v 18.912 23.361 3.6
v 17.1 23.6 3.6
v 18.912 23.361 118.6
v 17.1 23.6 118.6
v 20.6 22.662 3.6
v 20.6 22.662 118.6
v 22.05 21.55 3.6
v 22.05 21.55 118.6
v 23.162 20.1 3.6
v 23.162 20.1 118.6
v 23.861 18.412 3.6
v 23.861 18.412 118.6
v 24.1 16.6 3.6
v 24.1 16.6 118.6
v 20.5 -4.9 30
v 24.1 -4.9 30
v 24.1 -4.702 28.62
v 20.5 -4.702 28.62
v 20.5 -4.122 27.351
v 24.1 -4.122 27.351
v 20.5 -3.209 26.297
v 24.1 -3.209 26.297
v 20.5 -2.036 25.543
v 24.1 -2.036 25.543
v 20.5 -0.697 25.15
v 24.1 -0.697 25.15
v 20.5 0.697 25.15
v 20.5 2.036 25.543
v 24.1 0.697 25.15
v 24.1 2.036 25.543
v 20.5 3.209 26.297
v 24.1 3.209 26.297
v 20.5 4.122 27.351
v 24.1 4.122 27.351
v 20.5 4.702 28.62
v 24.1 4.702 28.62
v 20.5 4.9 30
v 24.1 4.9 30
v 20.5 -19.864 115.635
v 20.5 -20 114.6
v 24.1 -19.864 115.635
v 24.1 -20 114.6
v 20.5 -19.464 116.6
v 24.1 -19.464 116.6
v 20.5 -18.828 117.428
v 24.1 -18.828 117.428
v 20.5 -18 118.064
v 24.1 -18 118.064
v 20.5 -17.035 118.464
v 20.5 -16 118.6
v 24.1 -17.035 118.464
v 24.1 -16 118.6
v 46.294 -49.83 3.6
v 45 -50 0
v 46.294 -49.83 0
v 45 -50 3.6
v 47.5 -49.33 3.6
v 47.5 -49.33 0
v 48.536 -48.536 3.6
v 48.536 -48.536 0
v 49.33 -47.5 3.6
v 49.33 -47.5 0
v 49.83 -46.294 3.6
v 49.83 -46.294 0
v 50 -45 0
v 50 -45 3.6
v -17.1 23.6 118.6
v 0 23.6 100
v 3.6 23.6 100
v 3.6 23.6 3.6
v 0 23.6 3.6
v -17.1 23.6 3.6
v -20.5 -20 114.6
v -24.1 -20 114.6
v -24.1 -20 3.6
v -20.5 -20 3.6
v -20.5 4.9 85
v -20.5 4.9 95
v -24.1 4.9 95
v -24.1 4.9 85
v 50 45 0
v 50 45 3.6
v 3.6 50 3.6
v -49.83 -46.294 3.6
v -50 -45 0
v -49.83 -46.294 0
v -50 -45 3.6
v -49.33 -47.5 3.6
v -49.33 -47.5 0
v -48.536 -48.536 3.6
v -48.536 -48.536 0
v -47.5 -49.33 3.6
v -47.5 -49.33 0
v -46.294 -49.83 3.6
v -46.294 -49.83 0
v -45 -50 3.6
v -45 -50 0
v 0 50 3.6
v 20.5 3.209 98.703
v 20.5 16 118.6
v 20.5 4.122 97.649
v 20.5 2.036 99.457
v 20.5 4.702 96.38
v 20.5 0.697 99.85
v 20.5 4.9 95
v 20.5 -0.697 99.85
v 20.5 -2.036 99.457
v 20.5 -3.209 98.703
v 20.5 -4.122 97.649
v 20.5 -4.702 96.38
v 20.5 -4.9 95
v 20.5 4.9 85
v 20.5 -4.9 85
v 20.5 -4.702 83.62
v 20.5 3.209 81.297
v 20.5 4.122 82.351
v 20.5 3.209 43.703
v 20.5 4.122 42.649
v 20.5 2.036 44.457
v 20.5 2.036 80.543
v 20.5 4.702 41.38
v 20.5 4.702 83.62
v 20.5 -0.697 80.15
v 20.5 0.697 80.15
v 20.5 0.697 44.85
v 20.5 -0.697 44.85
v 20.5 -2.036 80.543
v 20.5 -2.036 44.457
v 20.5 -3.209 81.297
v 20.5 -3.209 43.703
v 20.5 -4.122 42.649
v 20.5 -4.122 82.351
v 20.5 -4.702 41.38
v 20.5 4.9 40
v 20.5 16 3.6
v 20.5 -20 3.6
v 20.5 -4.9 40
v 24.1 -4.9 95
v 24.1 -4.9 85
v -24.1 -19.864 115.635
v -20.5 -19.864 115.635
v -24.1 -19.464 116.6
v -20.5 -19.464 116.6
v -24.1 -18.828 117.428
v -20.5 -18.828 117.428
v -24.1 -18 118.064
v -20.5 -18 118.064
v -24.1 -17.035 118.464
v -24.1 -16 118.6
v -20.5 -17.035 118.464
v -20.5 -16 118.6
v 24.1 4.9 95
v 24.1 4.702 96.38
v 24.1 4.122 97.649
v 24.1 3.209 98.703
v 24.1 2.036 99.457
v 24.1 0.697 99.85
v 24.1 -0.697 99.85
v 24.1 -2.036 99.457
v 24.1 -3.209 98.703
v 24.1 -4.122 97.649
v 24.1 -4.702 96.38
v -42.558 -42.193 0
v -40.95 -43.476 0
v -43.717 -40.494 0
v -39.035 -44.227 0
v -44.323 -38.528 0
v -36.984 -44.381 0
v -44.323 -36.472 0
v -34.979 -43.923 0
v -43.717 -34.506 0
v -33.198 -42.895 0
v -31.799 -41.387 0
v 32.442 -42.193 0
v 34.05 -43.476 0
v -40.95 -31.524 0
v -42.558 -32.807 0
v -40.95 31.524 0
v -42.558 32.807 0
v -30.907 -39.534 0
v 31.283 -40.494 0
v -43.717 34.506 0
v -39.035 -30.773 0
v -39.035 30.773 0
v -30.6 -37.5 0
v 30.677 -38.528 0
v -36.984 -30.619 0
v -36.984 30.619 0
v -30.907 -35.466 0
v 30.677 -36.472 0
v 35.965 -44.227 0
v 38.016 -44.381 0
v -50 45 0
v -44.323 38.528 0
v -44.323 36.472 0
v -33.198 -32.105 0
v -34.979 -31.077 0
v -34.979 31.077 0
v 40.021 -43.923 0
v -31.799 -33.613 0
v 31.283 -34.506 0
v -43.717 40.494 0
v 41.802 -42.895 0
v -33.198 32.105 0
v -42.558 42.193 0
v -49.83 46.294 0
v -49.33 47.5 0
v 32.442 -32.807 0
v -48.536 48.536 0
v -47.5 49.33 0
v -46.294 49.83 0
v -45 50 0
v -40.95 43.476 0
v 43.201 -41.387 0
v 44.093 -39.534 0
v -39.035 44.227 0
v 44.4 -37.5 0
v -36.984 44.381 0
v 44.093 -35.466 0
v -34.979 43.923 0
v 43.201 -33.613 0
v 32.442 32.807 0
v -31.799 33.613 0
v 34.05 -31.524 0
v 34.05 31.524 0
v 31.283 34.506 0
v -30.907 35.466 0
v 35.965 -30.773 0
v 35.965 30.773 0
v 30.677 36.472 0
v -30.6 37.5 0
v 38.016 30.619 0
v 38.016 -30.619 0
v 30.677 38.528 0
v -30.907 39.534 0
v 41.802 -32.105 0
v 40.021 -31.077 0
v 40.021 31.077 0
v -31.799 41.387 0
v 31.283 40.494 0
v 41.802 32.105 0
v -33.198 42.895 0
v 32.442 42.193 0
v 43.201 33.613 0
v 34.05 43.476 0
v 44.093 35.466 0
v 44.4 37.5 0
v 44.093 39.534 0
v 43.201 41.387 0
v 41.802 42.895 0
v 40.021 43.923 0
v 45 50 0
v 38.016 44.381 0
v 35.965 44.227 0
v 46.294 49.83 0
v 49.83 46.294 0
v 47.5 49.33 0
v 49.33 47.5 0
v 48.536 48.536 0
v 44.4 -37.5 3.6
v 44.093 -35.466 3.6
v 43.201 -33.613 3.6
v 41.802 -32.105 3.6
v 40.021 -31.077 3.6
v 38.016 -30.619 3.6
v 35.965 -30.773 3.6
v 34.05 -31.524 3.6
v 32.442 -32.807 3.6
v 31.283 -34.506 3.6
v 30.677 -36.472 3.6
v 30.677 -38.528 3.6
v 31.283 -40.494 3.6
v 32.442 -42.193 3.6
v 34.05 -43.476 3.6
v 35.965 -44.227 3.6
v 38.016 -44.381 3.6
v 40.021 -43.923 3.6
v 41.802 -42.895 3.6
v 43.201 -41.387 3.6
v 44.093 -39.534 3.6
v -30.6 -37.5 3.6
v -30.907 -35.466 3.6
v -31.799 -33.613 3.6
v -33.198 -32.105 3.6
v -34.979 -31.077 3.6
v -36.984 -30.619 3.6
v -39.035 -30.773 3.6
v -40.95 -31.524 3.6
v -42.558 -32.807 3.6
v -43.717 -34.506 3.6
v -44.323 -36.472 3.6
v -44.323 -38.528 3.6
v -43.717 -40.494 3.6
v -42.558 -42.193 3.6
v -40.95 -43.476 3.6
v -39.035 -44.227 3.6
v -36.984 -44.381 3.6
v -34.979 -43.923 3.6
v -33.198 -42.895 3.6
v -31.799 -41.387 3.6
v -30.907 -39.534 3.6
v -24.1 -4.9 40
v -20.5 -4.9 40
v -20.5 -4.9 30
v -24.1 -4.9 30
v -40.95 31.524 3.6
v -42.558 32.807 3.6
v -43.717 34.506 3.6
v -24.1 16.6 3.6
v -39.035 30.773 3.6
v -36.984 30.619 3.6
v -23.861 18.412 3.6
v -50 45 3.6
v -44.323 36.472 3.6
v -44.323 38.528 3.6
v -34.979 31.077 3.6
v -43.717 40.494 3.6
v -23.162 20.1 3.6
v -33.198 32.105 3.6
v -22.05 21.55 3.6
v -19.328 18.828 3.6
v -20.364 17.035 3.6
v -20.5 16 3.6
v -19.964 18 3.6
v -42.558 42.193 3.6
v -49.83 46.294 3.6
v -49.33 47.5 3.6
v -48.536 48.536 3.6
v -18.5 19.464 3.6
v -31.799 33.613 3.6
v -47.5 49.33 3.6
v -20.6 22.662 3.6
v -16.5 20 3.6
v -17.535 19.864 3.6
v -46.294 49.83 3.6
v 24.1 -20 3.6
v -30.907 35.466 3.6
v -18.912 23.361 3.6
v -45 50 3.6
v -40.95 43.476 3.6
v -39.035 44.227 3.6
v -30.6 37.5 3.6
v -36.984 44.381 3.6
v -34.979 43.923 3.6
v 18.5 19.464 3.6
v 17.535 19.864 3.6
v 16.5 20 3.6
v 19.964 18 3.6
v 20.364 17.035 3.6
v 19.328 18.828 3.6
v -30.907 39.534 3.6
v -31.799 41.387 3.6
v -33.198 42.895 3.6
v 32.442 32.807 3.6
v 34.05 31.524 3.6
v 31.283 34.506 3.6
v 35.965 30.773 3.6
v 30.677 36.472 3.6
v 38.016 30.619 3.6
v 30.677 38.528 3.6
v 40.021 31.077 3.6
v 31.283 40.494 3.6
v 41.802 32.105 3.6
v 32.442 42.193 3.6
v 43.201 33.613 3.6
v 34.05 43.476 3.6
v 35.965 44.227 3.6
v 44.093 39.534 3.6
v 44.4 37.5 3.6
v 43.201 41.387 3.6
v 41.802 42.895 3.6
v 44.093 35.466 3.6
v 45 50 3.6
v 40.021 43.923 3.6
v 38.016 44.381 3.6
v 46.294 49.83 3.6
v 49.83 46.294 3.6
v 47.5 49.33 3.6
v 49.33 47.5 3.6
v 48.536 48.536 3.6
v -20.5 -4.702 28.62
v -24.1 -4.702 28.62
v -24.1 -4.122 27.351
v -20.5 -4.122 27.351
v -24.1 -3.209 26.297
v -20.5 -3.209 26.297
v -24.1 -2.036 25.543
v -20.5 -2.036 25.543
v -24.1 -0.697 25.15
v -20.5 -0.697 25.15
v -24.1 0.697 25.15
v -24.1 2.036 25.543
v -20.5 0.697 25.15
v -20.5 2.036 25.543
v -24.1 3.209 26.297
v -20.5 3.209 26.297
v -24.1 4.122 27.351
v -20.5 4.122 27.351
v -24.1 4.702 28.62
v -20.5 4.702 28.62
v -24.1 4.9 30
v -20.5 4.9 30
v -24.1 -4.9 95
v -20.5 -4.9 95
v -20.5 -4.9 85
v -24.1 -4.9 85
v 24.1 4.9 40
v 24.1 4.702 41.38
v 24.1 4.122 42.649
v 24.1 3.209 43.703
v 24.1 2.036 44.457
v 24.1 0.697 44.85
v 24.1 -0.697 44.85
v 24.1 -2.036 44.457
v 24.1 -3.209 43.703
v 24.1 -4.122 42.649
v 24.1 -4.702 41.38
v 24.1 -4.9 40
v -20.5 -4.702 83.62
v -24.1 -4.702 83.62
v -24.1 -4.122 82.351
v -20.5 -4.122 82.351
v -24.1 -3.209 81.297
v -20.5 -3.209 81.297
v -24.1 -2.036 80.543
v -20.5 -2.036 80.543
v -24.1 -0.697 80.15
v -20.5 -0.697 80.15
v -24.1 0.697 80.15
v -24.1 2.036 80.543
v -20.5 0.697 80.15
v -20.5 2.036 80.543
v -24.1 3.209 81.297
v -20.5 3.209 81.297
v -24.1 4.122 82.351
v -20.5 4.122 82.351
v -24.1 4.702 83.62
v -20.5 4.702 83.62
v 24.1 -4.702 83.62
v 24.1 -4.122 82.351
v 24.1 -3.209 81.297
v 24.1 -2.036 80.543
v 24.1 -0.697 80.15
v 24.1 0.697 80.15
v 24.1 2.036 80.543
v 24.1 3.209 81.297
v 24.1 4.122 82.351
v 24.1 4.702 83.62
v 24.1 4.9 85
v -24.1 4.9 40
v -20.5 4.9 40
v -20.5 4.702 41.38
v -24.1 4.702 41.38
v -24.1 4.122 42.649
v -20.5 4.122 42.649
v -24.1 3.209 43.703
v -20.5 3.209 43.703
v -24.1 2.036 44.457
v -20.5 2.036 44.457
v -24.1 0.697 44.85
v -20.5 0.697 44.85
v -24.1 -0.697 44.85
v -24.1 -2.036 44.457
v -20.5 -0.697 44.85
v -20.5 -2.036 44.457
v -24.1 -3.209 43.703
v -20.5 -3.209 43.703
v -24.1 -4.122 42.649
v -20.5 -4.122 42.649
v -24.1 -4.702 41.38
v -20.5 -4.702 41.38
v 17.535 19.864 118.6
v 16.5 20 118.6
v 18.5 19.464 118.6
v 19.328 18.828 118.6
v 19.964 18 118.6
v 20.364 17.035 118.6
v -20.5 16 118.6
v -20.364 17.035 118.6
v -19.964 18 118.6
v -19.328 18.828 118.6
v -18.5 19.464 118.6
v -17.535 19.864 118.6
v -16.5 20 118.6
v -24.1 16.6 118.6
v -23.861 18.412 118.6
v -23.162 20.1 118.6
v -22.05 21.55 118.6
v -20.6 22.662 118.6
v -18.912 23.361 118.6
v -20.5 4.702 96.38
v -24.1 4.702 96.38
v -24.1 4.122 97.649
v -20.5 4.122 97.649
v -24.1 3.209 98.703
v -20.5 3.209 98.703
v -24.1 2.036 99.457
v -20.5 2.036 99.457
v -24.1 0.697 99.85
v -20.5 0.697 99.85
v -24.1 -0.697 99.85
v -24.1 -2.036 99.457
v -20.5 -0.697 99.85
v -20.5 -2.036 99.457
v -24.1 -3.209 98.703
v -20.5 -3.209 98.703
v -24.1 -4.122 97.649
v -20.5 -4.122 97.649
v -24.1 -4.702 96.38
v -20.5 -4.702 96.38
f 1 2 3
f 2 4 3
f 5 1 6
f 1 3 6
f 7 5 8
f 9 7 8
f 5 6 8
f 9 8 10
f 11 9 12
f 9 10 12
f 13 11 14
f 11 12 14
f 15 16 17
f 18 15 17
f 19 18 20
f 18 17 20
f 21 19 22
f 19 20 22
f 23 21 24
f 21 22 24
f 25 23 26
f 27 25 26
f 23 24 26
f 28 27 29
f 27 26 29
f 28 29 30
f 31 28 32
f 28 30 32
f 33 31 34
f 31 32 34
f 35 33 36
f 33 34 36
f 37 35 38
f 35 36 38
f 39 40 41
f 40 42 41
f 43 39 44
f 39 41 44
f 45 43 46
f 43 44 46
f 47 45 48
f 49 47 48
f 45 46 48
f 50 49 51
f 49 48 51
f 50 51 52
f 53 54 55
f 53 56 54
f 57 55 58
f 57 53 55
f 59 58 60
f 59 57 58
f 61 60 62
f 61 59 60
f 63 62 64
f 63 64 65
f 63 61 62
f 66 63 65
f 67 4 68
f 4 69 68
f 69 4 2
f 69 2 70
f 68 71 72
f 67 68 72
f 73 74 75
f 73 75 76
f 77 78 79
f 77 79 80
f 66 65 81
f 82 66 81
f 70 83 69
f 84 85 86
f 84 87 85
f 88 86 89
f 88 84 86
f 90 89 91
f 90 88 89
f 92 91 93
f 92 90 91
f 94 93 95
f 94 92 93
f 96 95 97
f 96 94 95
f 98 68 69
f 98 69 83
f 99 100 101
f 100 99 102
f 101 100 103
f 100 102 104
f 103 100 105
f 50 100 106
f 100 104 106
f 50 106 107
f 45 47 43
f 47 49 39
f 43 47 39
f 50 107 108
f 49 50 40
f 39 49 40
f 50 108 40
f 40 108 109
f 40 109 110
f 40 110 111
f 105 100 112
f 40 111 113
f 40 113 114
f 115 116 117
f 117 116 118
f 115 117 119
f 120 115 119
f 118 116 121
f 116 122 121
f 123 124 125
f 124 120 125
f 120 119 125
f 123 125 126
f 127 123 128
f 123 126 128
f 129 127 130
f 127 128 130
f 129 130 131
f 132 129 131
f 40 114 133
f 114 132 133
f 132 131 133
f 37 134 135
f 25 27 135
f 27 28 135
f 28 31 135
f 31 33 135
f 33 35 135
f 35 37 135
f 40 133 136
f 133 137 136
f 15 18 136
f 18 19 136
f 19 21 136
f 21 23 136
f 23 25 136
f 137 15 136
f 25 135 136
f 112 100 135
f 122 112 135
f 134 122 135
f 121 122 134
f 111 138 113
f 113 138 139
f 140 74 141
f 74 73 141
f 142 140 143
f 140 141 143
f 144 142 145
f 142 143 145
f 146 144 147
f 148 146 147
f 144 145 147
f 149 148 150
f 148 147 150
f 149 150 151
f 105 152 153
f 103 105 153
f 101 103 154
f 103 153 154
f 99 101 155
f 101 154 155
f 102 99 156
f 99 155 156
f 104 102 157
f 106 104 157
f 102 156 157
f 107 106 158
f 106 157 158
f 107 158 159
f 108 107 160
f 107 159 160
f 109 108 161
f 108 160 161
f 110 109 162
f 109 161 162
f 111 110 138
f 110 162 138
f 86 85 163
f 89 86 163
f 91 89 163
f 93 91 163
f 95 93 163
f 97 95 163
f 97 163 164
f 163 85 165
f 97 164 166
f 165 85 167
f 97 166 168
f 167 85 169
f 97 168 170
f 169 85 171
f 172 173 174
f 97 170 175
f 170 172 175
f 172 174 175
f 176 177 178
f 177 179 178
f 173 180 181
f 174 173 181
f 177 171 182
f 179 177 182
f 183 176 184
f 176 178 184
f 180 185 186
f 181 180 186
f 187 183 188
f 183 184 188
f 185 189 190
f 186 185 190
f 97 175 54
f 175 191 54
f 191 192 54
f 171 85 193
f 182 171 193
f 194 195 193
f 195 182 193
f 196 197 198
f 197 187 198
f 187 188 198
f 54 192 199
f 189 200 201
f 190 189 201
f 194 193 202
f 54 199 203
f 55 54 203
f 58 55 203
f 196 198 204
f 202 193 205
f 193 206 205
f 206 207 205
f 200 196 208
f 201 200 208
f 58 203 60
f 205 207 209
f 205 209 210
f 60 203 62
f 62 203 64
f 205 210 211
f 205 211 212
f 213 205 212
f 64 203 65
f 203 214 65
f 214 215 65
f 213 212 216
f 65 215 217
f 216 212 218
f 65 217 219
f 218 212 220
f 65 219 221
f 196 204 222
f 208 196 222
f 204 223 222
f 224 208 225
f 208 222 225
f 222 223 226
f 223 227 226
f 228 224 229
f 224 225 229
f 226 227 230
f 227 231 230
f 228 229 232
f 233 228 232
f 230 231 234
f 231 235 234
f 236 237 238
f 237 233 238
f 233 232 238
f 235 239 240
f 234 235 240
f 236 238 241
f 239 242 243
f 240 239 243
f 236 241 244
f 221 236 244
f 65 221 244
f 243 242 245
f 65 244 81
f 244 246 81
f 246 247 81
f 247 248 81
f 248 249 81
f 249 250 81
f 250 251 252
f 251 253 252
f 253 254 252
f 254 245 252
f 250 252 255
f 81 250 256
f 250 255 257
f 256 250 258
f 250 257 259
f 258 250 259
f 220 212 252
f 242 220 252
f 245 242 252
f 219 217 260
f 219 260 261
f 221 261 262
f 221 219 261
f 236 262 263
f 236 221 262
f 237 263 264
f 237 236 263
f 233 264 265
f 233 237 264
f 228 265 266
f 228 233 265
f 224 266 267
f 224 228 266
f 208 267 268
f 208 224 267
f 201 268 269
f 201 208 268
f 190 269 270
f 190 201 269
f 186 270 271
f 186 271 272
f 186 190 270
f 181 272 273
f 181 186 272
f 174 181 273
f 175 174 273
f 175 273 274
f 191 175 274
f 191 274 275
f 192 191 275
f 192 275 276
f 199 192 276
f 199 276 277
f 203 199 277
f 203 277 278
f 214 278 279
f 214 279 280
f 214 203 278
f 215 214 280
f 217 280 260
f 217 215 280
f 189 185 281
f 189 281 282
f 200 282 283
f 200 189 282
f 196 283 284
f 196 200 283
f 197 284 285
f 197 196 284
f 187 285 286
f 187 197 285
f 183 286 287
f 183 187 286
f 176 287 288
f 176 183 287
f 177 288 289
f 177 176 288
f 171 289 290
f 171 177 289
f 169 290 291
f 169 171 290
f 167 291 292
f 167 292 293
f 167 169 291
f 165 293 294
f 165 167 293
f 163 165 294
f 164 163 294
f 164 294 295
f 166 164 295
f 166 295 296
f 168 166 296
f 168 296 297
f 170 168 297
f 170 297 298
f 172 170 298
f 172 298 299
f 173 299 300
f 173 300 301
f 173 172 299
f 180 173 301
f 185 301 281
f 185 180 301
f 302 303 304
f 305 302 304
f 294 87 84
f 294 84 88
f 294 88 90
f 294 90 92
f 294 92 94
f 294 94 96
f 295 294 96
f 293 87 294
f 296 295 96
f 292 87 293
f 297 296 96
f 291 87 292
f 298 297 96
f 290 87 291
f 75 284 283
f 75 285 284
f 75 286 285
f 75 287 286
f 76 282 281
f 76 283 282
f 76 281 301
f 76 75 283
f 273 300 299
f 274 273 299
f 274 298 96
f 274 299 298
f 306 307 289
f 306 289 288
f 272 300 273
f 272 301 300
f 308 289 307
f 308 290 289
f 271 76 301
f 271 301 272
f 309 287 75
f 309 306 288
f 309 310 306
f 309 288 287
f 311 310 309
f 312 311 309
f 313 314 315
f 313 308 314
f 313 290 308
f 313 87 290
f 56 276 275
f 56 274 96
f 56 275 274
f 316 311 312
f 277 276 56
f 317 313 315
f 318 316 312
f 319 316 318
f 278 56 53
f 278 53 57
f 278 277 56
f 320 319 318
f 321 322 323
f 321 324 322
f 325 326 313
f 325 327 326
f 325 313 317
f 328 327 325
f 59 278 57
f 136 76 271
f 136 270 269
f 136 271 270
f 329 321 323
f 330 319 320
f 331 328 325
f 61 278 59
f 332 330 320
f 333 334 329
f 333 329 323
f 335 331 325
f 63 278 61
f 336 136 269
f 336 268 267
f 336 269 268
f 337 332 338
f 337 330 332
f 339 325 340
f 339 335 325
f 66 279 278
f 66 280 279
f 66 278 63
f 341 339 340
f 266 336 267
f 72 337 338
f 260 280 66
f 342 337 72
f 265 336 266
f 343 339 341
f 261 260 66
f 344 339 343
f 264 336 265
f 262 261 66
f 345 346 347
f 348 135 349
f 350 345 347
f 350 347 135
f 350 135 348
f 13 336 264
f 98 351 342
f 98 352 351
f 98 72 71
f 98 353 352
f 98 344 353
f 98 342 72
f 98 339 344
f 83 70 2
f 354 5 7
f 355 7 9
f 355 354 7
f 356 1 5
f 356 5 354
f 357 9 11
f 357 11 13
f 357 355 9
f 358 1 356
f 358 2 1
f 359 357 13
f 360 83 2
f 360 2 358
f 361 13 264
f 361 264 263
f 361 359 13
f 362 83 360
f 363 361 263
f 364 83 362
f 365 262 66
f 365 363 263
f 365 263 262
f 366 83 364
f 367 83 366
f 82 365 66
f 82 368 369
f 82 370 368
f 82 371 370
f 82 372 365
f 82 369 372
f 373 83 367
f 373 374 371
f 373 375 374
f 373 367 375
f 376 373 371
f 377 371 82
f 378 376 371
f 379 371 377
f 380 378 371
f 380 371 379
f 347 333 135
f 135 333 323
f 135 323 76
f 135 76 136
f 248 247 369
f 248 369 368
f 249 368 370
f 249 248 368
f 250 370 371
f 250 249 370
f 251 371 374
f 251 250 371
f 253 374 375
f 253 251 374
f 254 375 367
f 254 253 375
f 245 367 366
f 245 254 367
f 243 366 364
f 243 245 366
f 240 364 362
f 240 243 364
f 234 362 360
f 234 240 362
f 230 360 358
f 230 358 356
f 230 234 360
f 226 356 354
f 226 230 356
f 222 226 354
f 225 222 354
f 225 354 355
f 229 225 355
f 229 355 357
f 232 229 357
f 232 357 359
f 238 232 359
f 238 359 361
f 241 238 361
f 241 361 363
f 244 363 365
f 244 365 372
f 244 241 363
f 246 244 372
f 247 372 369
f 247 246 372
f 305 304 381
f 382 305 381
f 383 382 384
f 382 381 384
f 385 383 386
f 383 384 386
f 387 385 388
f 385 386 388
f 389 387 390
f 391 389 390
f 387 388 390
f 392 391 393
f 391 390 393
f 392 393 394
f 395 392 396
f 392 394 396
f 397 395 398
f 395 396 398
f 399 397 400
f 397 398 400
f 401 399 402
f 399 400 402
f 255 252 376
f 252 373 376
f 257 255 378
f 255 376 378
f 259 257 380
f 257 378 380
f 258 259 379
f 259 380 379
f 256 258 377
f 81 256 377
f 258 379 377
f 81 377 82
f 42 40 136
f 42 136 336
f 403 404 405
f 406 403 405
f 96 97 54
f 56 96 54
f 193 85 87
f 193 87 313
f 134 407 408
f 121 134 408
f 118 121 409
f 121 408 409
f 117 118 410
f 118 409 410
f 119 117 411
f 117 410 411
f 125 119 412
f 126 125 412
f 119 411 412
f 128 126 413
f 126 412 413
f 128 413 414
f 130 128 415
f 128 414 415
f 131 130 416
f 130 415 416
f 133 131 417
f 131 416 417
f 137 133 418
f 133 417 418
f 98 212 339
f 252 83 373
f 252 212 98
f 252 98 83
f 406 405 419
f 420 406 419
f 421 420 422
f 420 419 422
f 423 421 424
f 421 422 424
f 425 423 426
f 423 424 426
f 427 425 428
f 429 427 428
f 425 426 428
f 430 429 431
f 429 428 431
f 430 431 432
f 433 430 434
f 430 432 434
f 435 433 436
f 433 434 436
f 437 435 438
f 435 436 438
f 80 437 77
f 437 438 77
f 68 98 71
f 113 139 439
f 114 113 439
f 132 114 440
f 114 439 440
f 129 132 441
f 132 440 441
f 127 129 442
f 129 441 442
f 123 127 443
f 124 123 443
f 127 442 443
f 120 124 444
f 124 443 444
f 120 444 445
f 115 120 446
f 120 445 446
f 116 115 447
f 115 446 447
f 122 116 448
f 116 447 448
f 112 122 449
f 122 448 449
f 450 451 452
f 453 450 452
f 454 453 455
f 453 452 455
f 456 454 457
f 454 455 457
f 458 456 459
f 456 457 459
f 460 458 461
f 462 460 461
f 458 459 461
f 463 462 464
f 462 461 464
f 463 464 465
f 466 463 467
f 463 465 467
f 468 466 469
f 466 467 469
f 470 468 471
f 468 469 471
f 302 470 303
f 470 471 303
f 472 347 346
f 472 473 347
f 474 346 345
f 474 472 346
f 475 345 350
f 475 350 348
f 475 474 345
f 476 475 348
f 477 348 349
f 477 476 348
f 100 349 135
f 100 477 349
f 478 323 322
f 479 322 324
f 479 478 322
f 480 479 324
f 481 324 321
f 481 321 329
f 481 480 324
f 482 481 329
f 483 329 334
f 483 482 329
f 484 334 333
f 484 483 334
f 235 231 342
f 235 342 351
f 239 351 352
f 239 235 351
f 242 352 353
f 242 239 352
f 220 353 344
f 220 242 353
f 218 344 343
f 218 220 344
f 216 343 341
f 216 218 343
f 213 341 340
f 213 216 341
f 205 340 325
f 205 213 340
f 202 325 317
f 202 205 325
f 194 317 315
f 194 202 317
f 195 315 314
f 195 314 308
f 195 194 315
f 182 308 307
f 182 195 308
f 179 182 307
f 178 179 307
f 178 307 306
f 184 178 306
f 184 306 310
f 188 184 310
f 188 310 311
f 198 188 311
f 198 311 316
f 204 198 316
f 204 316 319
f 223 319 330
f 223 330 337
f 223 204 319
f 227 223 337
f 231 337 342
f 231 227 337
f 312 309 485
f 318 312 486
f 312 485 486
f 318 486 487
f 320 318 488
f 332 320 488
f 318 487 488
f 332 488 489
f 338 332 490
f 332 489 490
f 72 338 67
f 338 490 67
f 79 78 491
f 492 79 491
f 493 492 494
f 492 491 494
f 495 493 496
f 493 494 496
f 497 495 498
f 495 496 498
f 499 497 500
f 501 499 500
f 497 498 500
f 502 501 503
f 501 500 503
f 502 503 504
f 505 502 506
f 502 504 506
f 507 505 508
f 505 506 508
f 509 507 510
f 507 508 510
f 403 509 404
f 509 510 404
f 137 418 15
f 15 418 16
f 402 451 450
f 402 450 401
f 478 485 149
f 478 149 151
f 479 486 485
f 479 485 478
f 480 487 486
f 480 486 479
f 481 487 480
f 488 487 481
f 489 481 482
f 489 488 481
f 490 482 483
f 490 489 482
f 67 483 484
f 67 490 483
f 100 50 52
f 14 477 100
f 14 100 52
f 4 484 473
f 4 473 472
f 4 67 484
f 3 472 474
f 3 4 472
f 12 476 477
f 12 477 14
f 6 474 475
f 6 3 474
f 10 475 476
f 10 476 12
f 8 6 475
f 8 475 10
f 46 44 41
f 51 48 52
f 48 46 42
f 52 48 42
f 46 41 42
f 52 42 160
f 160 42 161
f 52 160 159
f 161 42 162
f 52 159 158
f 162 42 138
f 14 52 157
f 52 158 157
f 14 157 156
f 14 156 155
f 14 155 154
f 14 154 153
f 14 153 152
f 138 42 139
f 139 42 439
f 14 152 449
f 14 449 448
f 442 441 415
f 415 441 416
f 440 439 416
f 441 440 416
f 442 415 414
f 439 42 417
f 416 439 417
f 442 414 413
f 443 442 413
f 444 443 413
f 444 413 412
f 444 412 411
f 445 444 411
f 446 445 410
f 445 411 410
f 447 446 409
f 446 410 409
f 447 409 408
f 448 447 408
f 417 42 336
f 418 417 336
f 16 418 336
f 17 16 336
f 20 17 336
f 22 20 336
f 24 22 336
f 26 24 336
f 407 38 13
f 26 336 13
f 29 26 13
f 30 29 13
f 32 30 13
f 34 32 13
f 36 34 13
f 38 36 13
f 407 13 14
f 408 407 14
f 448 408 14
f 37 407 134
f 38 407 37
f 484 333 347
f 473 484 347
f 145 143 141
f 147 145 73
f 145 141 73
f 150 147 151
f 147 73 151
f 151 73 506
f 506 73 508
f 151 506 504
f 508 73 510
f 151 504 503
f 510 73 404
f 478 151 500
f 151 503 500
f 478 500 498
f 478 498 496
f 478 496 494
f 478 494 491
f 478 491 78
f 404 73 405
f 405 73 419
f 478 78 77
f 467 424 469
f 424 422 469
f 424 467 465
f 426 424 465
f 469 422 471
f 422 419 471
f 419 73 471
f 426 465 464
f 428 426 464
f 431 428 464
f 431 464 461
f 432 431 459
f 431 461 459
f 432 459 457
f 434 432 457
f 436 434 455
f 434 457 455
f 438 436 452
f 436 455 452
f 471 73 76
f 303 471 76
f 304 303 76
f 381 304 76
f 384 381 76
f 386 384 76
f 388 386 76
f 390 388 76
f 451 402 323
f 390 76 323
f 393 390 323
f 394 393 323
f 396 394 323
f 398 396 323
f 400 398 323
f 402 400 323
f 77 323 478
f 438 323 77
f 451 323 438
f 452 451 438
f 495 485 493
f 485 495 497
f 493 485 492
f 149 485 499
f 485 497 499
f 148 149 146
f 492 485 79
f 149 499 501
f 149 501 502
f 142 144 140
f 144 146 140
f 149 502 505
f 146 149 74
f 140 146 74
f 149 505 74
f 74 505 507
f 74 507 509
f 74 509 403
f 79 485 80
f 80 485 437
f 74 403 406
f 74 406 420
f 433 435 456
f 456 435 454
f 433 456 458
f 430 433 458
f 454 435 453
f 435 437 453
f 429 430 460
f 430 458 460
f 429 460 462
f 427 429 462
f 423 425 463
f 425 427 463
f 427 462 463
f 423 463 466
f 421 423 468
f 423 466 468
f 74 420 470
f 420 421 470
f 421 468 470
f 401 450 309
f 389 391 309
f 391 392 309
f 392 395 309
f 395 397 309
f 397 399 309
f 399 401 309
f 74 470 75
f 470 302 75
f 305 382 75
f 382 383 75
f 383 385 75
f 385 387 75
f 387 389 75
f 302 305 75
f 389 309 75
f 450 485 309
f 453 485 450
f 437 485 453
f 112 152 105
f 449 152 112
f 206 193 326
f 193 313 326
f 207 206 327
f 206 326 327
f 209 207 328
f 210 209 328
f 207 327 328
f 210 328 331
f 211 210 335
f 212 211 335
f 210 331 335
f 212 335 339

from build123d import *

# Parameters (mm, degrees)
SKETCH_W     = 100
SKETCH_H     = 100
SKETCH_R     = 6.9
PAD_DEPTH    = 3.6
PAD001_DEPTH = 115
POCKET_DEPTH = 74.101
PAD002_DEPTH = 3.6
FILLET_R     = 5
FILLET001_R  = 4
FILLET002_R  = 7


with BuildPart() as part:
    # Sketch → Pad (new body)
    with BuildSketch(Plane.XY):
        Rectangle(SKETCH_W, SKETCH_H)
        with Locations((37.5, 37.5)):
            Circle(SKETCH_R, mode=Mode.SUBTRACT)
        with Locations((-37.5, 37.5)):
            Circle(SKETCH_R, mode=Mode.SUBTRACT)
        with Locations((37.5, -37.5)):
            Circle(SKETCH_R, mode=Mode.SUBTRACT)
        with Locations((-37.5, -37.5)):
            Circle(SKETCH_R, mode=Mode.SUBTRACT)
    extrude(amount=PAD_DEPTH)

    # Sketch001 (on Face10 of Pad) → Pad001 (join)
    with BuildSketch(Plane.XY.offset(3.6)):
        Polygon((-20.5, -20), (-20.5, 20), (20.5, 20), (20.5, -20), (24.1, -20), (24.1, 23.6), (-24.1, 23.6), (-24.1, -20), align=None)
    extrude(amount=PAD001_DEPTH)

    # Sketch002 (on Face15 of Pad001) → Pocket (cut, through all)
    with BuildSketch(Plane.YZ.offset(24.1)):
        with BuildLine():
            ThreePointArc((4.9, 95), (0, 99.9), (-4.9, 95))
            Line((-4.9, 95), (-4.9, 85))
            ThreePointArc((-4.9, 85), (0, 80.1), (4.9, 85))
            Line((4.9, 95), (4.9, 85))
        make_face()
        with BuildLine():
            ThreePointArc((4.9, 40), (0, 44.9), (-4.9, 40))
            Line((-4.9, 40), (-4.9, 30))
            ThreePointArc((-4.9, 30), (0, 25.1), (4.9, 30))
            Line((4.9, 40), (4.9, 30))
        make_face()
    extrude(amount=-POCKET_DEPTH, mode=Mode.SUBTRACT)

    # Sketch003 → Pad002 (join)
    with BuildSketch(Plane.YZ):
        Polygon((23.6, 100), (50, 3.6), (23.6, 3.6), align=None)
    extrude(amount=PAD002_DEPTH)

    # Fillet
    fillet_edges = [part.edges().sort_by_distance(p)[0] for p in [
        (-50, 50, 1.8),
        (-50, -50, 1.8),
        (50, -50, 1.8),
        (50, 50, 1.8),
    ]]
    fillet(fillet_edges, radius=FILLET_R)

    # Fillet001
    fillet001_edges = [part.edges().sort_by_distance(p)[0] for p in [
        (22.3, -20, 118.6),
        (-22.3, -20, 118.6),
        (20.5, 20, 61.1),
        (-20.5, 20, 61.1),
    ]]
    fillet(fillet001_edges, radius=FILLET001_R)

    # Fillet002
    fillet002_edges = [part.edges().sort_by_distance(p)[0] for p in [
        (24.1, 23.6, 61.1),
        (-24.1, 23.6, 61.1),
    ]]
    fillet(fillet002_edges, radius=FILLET002_R)


solid = part.part
